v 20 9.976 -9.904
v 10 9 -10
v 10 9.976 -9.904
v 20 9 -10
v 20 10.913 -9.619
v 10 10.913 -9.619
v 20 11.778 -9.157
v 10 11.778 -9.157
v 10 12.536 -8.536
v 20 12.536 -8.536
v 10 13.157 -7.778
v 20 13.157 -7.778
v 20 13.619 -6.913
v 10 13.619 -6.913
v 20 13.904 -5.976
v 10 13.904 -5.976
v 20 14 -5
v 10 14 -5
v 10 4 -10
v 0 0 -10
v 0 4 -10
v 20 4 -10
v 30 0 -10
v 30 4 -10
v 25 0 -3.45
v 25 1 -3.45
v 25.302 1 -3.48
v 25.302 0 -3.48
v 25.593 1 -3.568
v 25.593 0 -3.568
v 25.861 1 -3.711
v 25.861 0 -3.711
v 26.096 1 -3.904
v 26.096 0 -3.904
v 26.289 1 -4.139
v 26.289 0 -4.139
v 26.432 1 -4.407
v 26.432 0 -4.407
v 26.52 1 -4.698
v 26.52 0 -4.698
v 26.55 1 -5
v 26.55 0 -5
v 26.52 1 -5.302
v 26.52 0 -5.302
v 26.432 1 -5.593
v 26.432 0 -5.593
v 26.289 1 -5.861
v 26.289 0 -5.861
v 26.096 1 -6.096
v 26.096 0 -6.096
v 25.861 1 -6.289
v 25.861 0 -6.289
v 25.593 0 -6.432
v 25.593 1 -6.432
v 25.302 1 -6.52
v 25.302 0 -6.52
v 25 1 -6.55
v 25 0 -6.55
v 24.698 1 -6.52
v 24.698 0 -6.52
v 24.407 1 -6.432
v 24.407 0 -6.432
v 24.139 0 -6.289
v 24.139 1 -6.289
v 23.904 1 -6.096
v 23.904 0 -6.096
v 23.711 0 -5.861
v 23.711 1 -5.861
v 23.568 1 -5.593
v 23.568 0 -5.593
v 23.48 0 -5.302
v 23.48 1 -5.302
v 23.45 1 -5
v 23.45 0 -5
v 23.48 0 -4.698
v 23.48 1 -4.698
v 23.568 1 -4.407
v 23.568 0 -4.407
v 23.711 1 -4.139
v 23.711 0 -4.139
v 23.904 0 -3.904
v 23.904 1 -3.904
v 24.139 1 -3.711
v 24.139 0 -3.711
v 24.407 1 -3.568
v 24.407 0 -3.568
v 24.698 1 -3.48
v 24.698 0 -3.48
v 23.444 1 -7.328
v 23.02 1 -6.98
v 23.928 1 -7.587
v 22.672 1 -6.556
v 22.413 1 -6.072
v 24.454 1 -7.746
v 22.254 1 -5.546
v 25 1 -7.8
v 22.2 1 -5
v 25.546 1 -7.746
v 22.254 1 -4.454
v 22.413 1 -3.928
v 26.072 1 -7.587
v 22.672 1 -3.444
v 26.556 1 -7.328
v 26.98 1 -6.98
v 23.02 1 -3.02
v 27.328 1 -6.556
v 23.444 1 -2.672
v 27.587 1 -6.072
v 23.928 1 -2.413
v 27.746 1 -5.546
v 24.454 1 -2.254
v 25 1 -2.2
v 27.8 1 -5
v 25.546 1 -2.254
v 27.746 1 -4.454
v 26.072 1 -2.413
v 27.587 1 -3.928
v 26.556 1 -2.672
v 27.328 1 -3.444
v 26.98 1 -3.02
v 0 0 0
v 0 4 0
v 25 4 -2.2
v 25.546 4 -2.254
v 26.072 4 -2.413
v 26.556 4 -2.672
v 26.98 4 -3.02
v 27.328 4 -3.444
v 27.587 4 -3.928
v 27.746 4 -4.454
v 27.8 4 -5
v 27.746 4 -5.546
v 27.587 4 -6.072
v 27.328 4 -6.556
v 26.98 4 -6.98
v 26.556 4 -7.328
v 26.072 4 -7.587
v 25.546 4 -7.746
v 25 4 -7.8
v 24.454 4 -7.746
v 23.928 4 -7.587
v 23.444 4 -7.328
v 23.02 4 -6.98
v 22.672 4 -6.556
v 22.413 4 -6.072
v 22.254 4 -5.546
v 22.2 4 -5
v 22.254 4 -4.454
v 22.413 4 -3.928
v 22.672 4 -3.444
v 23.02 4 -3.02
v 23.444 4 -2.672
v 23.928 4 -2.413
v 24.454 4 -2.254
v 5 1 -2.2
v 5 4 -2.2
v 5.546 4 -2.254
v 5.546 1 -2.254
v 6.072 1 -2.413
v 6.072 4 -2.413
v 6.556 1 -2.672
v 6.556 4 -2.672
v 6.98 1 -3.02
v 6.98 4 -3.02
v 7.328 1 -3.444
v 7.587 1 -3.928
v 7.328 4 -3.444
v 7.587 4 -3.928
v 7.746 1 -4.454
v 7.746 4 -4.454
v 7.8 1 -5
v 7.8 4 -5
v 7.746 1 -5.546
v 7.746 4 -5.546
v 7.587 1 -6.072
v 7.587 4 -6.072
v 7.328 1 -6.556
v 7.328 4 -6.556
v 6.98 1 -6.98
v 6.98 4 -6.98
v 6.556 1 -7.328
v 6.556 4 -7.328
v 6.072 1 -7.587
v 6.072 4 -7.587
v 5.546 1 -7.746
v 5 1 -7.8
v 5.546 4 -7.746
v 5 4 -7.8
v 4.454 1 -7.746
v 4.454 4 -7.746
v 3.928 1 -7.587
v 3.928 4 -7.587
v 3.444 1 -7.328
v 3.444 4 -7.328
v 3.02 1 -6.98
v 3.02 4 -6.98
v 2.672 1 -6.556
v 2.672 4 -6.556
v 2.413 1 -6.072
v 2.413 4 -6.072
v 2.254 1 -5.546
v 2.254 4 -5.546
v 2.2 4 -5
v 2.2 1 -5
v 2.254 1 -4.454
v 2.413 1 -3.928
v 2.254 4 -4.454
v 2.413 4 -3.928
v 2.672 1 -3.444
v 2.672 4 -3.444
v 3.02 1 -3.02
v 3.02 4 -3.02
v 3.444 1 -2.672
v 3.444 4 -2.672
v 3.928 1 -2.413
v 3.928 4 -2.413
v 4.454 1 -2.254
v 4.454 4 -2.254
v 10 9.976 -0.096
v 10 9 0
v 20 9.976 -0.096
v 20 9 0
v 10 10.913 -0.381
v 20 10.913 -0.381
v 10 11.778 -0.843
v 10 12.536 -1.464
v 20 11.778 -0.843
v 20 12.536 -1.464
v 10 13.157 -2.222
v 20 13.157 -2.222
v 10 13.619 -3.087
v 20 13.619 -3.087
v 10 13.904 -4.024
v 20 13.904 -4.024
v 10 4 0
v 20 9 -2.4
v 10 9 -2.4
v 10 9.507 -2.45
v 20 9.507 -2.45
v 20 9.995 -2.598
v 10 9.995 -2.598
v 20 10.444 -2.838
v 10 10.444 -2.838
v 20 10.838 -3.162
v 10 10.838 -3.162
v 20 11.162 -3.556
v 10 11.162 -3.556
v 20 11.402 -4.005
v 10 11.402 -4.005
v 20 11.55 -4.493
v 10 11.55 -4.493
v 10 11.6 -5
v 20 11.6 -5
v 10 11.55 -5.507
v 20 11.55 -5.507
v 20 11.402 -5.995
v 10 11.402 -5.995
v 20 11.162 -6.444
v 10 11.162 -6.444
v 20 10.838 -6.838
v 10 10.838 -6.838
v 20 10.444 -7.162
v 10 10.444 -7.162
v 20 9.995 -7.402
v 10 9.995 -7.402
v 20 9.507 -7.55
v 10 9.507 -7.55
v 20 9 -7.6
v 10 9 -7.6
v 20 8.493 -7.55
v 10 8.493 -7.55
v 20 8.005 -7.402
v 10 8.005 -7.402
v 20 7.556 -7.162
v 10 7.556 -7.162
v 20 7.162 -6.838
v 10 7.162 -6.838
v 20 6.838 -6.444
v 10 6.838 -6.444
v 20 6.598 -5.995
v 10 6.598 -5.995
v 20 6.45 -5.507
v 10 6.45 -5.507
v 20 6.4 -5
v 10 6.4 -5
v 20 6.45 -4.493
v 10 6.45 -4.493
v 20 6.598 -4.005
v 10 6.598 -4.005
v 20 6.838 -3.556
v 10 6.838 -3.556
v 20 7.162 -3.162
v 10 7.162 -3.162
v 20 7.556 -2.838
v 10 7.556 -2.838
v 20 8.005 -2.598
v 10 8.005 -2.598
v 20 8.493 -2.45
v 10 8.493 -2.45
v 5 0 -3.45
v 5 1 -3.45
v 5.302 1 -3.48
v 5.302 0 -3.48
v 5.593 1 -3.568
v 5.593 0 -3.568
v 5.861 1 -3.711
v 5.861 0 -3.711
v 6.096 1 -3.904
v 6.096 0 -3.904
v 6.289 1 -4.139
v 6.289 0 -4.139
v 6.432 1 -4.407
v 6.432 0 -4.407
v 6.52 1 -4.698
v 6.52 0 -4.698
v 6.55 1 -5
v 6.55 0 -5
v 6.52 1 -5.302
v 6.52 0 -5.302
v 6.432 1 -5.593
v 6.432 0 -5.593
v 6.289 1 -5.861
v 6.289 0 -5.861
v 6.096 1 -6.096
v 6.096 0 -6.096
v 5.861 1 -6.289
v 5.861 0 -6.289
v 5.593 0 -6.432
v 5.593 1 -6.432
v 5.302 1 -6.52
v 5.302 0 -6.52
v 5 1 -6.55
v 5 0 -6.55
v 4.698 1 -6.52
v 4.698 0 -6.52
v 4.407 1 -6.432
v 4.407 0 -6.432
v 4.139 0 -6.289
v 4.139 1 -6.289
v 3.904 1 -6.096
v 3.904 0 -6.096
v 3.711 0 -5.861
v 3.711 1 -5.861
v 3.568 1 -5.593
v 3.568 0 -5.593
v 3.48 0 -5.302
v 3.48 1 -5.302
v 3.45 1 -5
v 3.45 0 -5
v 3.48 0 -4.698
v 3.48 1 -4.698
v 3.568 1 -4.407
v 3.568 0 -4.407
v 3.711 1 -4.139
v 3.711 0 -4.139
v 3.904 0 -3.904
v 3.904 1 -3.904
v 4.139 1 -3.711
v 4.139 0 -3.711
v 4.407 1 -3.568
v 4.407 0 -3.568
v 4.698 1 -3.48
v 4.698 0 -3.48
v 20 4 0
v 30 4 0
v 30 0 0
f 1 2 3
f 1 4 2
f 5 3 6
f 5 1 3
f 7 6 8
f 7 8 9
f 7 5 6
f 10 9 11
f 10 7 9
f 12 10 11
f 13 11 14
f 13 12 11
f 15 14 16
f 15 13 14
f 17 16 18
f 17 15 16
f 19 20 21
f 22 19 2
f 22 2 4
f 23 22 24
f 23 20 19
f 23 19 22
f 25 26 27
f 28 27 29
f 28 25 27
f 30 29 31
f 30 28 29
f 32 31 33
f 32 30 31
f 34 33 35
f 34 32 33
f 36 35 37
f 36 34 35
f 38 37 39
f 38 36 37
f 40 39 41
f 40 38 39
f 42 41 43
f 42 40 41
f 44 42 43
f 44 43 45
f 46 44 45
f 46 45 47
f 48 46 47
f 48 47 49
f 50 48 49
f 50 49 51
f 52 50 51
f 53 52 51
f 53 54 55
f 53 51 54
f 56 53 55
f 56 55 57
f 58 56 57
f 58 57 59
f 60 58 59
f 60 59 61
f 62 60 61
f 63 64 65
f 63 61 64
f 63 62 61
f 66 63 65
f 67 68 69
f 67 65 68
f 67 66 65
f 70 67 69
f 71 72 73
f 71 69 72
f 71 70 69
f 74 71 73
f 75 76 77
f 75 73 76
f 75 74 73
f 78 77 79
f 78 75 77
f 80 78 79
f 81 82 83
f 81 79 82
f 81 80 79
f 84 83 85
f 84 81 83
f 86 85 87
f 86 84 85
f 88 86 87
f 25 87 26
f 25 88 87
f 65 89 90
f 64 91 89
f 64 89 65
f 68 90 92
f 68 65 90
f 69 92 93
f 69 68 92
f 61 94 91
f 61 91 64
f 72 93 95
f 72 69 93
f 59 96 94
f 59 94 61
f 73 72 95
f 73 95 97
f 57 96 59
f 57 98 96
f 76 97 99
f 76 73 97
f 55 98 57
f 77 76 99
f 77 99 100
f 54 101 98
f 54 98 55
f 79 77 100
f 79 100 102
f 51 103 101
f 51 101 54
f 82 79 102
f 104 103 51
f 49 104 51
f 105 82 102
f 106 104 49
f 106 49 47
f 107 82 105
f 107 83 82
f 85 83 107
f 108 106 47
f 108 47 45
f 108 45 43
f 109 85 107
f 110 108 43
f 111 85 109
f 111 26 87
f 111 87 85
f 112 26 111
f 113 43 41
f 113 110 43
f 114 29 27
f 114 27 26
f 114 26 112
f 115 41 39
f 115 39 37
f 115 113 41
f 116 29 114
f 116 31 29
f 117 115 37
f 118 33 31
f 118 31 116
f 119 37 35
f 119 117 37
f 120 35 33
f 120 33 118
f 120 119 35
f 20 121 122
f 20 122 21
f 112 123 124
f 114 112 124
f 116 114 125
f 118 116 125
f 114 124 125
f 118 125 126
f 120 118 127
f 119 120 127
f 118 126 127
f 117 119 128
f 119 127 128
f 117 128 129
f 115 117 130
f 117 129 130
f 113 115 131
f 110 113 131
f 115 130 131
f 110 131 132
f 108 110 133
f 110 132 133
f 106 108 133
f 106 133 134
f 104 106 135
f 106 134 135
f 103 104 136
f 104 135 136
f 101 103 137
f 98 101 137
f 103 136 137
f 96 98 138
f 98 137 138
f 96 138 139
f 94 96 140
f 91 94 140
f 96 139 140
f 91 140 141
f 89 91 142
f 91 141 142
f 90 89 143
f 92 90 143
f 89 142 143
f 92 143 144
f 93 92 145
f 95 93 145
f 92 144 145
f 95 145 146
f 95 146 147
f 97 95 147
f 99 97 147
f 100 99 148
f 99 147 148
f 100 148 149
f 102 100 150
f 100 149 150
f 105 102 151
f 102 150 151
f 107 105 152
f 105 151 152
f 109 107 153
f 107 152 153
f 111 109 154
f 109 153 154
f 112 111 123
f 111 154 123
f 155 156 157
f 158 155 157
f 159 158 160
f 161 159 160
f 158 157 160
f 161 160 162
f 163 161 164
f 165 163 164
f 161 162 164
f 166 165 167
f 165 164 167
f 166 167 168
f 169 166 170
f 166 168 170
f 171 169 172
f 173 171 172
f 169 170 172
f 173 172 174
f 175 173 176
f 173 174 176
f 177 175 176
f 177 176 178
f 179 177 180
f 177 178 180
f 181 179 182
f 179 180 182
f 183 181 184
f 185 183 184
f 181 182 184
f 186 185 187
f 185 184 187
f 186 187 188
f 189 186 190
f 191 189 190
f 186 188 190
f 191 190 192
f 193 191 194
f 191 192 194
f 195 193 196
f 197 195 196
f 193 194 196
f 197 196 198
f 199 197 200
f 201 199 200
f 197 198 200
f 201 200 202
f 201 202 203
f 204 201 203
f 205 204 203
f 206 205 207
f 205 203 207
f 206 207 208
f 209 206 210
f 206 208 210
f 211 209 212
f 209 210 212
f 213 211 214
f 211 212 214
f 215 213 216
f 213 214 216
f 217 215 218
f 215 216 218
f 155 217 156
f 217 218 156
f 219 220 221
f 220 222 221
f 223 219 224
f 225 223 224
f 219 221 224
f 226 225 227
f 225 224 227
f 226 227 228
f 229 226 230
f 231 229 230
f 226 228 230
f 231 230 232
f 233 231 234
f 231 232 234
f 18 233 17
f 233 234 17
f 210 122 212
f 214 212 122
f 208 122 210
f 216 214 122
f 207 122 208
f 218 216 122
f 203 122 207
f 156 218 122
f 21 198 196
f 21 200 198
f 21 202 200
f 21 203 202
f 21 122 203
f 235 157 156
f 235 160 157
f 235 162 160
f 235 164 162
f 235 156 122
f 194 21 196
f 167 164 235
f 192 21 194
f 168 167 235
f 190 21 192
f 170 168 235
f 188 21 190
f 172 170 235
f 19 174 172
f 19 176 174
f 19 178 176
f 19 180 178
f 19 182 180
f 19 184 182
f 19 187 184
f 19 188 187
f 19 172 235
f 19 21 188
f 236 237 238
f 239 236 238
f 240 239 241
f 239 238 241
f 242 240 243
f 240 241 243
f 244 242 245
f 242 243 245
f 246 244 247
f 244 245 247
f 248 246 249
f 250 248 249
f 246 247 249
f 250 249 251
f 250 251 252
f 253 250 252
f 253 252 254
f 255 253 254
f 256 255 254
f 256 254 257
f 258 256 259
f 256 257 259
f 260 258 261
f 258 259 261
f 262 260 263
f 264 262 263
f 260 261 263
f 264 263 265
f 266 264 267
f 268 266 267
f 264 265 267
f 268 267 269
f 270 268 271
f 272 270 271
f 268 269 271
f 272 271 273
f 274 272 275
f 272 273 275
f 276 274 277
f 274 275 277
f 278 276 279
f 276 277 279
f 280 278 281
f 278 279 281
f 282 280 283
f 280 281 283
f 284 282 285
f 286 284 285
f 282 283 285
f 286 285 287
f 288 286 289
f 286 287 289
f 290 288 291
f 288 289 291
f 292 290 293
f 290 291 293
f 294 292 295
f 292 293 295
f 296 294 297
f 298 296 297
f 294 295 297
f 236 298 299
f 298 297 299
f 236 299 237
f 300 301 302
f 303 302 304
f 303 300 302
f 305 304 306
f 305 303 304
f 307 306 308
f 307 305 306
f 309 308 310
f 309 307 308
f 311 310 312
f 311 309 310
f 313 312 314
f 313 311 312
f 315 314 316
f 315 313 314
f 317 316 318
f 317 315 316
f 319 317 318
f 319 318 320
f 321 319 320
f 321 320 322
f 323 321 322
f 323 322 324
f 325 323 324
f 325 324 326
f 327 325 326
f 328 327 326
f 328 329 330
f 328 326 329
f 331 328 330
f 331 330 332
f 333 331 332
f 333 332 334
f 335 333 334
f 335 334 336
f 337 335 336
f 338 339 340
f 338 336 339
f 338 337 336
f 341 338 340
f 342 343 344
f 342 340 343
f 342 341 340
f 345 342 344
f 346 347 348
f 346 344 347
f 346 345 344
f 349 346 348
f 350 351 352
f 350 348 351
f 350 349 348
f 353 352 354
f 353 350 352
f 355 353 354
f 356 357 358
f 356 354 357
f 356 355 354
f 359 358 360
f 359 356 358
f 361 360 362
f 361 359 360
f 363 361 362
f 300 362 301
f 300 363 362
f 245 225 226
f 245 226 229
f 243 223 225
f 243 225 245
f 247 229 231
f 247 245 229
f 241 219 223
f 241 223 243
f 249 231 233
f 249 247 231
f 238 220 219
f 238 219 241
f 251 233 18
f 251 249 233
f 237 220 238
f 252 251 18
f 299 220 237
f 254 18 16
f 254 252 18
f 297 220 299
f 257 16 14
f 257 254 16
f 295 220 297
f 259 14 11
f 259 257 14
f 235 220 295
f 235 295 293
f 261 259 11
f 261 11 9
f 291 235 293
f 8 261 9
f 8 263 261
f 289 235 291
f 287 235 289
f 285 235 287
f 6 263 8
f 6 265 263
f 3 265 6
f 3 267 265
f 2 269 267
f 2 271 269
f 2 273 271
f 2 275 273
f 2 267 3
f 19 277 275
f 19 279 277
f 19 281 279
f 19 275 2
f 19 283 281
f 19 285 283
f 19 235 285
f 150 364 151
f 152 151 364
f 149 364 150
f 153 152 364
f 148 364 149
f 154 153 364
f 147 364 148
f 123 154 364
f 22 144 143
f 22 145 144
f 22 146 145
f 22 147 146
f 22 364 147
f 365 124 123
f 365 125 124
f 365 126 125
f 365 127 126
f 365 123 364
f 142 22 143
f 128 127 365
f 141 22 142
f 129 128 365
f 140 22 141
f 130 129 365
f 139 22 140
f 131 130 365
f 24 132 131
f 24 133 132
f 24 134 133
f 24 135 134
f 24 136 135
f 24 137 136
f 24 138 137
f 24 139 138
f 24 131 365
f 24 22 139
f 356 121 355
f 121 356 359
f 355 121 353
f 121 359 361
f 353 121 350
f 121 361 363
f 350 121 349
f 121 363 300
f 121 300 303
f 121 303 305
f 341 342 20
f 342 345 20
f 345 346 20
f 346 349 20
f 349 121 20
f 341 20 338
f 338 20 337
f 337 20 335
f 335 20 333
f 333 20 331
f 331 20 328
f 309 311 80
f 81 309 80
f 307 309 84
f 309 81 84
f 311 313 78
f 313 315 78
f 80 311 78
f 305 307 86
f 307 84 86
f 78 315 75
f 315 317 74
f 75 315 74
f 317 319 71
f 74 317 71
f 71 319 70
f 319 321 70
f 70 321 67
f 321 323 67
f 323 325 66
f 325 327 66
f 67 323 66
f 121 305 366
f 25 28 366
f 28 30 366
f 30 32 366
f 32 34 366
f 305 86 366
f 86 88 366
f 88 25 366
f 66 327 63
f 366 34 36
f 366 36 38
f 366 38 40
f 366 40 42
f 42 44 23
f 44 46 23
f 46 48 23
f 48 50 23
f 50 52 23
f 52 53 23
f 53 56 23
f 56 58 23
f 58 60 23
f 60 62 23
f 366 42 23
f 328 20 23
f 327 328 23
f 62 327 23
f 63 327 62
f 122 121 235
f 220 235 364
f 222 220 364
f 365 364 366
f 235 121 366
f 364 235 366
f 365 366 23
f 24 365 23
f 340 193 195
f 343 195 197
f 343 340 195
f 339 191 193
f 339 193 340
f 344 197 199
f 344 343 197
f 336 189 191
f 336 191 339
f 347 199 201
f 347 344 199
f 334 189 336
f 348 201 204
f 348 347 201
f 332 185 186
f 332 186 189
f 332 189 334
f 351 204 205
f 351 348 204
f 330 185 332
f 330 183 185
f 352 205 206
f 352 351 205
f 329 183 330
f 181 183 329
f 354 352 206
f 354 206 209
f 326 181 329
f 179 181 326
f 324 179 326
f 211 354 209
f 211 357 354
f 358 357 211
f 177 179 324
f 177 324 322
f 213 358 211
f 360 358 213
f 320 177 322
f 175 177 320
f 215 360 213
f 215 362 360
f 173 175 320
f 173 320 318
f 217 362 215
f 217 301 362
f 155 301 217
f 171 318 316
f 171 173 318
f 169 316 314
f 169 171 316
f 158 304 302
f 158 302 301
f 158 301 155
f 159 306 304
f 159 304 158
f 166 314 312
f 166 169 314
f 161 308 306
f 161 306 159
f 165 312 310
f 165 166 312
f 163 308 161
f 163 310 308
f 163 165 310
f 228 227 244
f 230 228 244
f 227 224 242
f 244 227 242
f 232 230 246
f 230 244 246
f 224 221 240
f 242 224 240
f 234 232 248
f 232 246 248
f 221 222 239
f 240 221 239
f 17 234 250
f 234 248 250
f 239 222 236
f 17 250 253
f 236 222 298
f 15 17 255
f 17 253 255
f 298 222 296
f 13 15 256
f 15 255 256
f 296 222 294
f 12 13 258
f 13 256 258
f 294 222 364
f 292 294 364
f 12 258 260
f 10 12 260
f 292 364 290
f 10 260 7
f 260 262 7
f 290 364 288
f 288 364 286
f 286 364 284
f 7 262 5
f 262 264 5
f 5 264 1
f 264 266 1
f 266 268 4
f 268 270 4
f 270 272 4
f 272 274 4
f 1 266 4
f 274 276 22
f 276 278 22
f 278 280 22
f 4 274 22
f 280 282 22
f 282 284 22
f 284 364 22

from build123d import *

# Parameters (mm, degrees)
CROQUIS1_W              = 30
CROQUIS1_H              = 10
CROQUIS1_R              = 1.55
SALIENTE_EXTRUIR1_DEPTH = 4
CROQUIS2_R              = 2.8
CORTAR_EXTRUIR1_DEPTH   = 3
CROQUIS3_W              = 10
CROQUIS3_H              = 10
SALIENTE_EXTRUIR2_DEPTH = 10
CROQUIS4_R              = 2.6
CORTAR_EXTRUIR2_DEPTH   = 10
REDONDEO3_R             = 5


with BuildPart() as part:
    # Croquis1 → Saliente-Extruir1 (new body)
    with BuildSketch(Plane(origin=(0, 0, 0), x_dir=(1, 0, 0), z_dir=(0, 1, 0))):
        with Locations((15, 5)):
            Rectangle(CROQUIS1_W, CROQUIS1_H)
        with Locations(Location((5, 5, 0), (0, 0, 270))):
            Circle(CROQUIS1_R, mode=Mode.SUBTRACT)
        with Locations(Location((25, 5, 0), (0, 0, 270))):
            Circle(CROQUIS1_R, mode=Mode.SUBTRACT)
    extrude(amount=SALIENTE_EXTRUIR1_DEPTH)

    # Croquis2 → Cortar-Extruir1 (cut)
    with BuildSketch(Plane(origin=(0, 4, 0), x_dir=(1, 0, 0), z_dir=(0, 1, 0))):
        with Locations(Location((5, 5, 0), (0, 0, 270))):
            Circle(CROQUIS2_R)
        with Locations(Location((25, 5, 0), (0, 0, 270))):
            Circle(CROQUIS2_R)
    extrude(amount=-CORTAR_EXTRUIR1_DEPTH, mode=Mode.SUBTRACT)

    # Croquis3 → Saliente-Extruir2 (add)
    with BuildSketch(Plane(origin=(0, 4, 0), x_dir=(1, 0, 0), z_dir=(0, 1, 0))):
        with Locations((15, 5)):
            Rectangle(CROQUIS3_W, CROQUIS3_H)
    extrude(amount=SALIENTE_EXTRUIR2_DEPTH)

    # Croquis4 → Cortar-Extruir2 (cut)
    with BuildSketch(Plane.ZY.offset(-10)):
        with Locations((-5, 9)):
            Circle(CROQUIS4_R)
    extrude(amount=-CORTAR_EXTRUIR2_DEPTH, mode=Mode.SUBTRACT)

    # Redondeo3
    redondeo3_edges = [part.edges().sort_by_distance(p)[0] for p in [
        (15, 14, 0),
        (15, 14, -10),
    ]]
    fillet(redondeo3_edges, radius=REDONDEO3_R - 0.0001)  # a hair under: the kernel refuses the full size


solid = part.part
